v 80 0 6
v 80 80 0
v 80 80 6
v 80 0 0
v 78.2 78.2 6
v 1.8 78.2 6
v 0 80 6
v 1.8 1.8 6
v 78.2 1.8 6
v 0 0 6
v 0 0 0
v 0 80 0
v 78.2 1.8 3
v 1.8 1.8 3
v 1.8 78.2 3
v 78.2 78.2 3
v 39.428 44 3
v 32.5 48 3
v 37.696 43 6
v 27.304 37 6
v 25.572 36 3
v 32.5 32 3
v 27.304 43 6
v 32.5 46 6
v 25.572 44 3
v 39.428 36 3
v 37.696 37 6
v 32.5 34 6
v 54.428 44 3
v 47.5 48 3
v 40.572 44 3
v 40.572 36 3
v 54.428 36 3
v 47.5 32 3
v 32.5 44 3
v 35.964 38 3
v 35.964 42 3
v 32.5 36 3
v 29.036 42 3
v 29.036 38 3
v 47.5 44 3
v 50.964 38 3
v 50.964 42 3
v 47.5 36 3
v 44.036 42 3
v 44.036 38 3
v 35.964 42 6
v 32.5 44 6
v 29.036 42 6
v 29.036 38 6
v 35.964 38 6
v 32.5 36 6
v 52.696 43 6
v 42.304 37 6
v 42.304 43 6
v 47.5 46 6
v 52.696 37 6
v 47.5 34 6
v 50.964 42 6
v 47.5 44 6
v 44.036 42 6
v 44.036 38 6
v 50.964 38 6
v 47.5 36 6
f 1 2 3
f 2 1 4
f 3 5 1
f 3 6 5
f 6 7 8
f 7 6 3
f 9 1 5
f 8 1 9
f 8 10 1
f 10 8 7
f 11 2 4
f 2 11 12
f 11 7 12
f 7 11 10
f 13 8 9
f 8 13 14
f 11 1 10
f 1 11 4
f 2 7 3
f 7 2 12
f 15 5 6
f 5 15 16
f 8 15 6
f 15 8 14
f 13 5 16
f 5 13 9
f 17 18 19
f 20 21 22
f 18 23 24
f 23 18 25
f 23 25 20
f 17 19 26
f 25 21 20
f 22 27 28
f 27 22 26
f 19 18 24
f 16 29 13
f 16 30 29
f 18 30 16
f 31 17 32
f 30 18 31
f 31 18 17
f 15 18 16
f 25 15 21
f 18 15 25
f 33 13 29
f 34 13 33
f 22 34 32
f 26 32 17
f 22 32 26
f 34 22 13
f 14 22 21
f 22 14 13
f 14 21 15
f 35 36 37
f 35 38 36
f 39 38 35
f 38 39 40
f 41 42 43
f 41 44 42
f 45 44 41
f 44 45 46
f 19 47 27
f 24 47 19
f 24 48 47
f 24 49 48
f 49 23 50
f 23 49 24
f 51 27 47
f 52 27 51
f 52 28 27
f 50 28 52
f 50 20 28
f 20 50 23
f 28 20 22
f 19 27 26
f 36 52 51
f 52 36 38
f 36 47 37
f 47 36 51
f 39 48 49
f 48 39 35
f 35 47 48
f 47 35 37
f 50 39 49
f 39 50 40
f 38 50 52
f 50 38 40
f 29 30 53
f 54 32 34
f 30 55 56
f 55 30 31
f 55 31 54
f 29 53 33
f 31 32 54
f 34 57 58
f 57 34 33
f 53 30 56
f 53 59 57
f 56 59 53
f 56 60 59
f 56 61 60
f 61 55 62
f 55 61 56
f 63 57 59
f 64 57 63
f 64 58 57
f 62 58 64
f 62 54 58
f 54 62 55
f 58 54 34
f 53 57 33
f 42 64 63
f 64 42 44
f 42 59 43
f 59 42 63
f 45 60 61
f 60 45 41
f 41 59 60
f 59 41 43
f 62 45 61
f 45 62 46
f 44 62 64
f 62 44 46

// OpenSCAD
btw=120;
bth=80;
btd=10;
ttw=80;
tth=80;
ttd=6;
xd1=15;
xd2=40;
*!for(xo=[xd1*-.5,xd1*.5],xo2=[xd2/2]) translate([btw/2-xo2+xo,bth/2]) cylinder(d=10,h=10,$fn=40);
top_plate();
module top_plate() {
  union() {
    cube([ttw,tth,3]);
    for(y=[0,tth-1.8]) translate([0,y])
      cube([ttw,1.8,ttd]);
    for(x=[0,ttw-1.8]) translate([x,0])
      cube([1.8,tth,ttd]);
    for(xo=[xd1/2,xd1/-2],xo2=[0])
      translate([ttw/2-xo+xo2,tth/2,3])
        rotate([0,0,30]) difference() {
          cylinder(d1=16,d2=12,h=3,$fn=6);
          translate([0,0,-.01]) cylinder(d=8,h=3.02,$fn=6);
        }
  }
}
module base_plate() {
difference() {
  cube([btw,bth,btd]);
  for(x=[5,btw/2+2.5],y=[5,bth/2+10])
  translate([x,y,-.01]) cube([btw/2-7.5,bth/2-15,btd+.02]);
  for(xo=[xd1*-.5,xd1*.5],xo2=[xd2/2])
  translate([btw/2-xo2+xo,bth/2,-.01]) {
    cylinder(d=5,h=btd+.02,$fn=30);
    translate([0,0,btd-5.5]) cylinder(d=9,h=5.52,$fn=40);
  }
}
}
